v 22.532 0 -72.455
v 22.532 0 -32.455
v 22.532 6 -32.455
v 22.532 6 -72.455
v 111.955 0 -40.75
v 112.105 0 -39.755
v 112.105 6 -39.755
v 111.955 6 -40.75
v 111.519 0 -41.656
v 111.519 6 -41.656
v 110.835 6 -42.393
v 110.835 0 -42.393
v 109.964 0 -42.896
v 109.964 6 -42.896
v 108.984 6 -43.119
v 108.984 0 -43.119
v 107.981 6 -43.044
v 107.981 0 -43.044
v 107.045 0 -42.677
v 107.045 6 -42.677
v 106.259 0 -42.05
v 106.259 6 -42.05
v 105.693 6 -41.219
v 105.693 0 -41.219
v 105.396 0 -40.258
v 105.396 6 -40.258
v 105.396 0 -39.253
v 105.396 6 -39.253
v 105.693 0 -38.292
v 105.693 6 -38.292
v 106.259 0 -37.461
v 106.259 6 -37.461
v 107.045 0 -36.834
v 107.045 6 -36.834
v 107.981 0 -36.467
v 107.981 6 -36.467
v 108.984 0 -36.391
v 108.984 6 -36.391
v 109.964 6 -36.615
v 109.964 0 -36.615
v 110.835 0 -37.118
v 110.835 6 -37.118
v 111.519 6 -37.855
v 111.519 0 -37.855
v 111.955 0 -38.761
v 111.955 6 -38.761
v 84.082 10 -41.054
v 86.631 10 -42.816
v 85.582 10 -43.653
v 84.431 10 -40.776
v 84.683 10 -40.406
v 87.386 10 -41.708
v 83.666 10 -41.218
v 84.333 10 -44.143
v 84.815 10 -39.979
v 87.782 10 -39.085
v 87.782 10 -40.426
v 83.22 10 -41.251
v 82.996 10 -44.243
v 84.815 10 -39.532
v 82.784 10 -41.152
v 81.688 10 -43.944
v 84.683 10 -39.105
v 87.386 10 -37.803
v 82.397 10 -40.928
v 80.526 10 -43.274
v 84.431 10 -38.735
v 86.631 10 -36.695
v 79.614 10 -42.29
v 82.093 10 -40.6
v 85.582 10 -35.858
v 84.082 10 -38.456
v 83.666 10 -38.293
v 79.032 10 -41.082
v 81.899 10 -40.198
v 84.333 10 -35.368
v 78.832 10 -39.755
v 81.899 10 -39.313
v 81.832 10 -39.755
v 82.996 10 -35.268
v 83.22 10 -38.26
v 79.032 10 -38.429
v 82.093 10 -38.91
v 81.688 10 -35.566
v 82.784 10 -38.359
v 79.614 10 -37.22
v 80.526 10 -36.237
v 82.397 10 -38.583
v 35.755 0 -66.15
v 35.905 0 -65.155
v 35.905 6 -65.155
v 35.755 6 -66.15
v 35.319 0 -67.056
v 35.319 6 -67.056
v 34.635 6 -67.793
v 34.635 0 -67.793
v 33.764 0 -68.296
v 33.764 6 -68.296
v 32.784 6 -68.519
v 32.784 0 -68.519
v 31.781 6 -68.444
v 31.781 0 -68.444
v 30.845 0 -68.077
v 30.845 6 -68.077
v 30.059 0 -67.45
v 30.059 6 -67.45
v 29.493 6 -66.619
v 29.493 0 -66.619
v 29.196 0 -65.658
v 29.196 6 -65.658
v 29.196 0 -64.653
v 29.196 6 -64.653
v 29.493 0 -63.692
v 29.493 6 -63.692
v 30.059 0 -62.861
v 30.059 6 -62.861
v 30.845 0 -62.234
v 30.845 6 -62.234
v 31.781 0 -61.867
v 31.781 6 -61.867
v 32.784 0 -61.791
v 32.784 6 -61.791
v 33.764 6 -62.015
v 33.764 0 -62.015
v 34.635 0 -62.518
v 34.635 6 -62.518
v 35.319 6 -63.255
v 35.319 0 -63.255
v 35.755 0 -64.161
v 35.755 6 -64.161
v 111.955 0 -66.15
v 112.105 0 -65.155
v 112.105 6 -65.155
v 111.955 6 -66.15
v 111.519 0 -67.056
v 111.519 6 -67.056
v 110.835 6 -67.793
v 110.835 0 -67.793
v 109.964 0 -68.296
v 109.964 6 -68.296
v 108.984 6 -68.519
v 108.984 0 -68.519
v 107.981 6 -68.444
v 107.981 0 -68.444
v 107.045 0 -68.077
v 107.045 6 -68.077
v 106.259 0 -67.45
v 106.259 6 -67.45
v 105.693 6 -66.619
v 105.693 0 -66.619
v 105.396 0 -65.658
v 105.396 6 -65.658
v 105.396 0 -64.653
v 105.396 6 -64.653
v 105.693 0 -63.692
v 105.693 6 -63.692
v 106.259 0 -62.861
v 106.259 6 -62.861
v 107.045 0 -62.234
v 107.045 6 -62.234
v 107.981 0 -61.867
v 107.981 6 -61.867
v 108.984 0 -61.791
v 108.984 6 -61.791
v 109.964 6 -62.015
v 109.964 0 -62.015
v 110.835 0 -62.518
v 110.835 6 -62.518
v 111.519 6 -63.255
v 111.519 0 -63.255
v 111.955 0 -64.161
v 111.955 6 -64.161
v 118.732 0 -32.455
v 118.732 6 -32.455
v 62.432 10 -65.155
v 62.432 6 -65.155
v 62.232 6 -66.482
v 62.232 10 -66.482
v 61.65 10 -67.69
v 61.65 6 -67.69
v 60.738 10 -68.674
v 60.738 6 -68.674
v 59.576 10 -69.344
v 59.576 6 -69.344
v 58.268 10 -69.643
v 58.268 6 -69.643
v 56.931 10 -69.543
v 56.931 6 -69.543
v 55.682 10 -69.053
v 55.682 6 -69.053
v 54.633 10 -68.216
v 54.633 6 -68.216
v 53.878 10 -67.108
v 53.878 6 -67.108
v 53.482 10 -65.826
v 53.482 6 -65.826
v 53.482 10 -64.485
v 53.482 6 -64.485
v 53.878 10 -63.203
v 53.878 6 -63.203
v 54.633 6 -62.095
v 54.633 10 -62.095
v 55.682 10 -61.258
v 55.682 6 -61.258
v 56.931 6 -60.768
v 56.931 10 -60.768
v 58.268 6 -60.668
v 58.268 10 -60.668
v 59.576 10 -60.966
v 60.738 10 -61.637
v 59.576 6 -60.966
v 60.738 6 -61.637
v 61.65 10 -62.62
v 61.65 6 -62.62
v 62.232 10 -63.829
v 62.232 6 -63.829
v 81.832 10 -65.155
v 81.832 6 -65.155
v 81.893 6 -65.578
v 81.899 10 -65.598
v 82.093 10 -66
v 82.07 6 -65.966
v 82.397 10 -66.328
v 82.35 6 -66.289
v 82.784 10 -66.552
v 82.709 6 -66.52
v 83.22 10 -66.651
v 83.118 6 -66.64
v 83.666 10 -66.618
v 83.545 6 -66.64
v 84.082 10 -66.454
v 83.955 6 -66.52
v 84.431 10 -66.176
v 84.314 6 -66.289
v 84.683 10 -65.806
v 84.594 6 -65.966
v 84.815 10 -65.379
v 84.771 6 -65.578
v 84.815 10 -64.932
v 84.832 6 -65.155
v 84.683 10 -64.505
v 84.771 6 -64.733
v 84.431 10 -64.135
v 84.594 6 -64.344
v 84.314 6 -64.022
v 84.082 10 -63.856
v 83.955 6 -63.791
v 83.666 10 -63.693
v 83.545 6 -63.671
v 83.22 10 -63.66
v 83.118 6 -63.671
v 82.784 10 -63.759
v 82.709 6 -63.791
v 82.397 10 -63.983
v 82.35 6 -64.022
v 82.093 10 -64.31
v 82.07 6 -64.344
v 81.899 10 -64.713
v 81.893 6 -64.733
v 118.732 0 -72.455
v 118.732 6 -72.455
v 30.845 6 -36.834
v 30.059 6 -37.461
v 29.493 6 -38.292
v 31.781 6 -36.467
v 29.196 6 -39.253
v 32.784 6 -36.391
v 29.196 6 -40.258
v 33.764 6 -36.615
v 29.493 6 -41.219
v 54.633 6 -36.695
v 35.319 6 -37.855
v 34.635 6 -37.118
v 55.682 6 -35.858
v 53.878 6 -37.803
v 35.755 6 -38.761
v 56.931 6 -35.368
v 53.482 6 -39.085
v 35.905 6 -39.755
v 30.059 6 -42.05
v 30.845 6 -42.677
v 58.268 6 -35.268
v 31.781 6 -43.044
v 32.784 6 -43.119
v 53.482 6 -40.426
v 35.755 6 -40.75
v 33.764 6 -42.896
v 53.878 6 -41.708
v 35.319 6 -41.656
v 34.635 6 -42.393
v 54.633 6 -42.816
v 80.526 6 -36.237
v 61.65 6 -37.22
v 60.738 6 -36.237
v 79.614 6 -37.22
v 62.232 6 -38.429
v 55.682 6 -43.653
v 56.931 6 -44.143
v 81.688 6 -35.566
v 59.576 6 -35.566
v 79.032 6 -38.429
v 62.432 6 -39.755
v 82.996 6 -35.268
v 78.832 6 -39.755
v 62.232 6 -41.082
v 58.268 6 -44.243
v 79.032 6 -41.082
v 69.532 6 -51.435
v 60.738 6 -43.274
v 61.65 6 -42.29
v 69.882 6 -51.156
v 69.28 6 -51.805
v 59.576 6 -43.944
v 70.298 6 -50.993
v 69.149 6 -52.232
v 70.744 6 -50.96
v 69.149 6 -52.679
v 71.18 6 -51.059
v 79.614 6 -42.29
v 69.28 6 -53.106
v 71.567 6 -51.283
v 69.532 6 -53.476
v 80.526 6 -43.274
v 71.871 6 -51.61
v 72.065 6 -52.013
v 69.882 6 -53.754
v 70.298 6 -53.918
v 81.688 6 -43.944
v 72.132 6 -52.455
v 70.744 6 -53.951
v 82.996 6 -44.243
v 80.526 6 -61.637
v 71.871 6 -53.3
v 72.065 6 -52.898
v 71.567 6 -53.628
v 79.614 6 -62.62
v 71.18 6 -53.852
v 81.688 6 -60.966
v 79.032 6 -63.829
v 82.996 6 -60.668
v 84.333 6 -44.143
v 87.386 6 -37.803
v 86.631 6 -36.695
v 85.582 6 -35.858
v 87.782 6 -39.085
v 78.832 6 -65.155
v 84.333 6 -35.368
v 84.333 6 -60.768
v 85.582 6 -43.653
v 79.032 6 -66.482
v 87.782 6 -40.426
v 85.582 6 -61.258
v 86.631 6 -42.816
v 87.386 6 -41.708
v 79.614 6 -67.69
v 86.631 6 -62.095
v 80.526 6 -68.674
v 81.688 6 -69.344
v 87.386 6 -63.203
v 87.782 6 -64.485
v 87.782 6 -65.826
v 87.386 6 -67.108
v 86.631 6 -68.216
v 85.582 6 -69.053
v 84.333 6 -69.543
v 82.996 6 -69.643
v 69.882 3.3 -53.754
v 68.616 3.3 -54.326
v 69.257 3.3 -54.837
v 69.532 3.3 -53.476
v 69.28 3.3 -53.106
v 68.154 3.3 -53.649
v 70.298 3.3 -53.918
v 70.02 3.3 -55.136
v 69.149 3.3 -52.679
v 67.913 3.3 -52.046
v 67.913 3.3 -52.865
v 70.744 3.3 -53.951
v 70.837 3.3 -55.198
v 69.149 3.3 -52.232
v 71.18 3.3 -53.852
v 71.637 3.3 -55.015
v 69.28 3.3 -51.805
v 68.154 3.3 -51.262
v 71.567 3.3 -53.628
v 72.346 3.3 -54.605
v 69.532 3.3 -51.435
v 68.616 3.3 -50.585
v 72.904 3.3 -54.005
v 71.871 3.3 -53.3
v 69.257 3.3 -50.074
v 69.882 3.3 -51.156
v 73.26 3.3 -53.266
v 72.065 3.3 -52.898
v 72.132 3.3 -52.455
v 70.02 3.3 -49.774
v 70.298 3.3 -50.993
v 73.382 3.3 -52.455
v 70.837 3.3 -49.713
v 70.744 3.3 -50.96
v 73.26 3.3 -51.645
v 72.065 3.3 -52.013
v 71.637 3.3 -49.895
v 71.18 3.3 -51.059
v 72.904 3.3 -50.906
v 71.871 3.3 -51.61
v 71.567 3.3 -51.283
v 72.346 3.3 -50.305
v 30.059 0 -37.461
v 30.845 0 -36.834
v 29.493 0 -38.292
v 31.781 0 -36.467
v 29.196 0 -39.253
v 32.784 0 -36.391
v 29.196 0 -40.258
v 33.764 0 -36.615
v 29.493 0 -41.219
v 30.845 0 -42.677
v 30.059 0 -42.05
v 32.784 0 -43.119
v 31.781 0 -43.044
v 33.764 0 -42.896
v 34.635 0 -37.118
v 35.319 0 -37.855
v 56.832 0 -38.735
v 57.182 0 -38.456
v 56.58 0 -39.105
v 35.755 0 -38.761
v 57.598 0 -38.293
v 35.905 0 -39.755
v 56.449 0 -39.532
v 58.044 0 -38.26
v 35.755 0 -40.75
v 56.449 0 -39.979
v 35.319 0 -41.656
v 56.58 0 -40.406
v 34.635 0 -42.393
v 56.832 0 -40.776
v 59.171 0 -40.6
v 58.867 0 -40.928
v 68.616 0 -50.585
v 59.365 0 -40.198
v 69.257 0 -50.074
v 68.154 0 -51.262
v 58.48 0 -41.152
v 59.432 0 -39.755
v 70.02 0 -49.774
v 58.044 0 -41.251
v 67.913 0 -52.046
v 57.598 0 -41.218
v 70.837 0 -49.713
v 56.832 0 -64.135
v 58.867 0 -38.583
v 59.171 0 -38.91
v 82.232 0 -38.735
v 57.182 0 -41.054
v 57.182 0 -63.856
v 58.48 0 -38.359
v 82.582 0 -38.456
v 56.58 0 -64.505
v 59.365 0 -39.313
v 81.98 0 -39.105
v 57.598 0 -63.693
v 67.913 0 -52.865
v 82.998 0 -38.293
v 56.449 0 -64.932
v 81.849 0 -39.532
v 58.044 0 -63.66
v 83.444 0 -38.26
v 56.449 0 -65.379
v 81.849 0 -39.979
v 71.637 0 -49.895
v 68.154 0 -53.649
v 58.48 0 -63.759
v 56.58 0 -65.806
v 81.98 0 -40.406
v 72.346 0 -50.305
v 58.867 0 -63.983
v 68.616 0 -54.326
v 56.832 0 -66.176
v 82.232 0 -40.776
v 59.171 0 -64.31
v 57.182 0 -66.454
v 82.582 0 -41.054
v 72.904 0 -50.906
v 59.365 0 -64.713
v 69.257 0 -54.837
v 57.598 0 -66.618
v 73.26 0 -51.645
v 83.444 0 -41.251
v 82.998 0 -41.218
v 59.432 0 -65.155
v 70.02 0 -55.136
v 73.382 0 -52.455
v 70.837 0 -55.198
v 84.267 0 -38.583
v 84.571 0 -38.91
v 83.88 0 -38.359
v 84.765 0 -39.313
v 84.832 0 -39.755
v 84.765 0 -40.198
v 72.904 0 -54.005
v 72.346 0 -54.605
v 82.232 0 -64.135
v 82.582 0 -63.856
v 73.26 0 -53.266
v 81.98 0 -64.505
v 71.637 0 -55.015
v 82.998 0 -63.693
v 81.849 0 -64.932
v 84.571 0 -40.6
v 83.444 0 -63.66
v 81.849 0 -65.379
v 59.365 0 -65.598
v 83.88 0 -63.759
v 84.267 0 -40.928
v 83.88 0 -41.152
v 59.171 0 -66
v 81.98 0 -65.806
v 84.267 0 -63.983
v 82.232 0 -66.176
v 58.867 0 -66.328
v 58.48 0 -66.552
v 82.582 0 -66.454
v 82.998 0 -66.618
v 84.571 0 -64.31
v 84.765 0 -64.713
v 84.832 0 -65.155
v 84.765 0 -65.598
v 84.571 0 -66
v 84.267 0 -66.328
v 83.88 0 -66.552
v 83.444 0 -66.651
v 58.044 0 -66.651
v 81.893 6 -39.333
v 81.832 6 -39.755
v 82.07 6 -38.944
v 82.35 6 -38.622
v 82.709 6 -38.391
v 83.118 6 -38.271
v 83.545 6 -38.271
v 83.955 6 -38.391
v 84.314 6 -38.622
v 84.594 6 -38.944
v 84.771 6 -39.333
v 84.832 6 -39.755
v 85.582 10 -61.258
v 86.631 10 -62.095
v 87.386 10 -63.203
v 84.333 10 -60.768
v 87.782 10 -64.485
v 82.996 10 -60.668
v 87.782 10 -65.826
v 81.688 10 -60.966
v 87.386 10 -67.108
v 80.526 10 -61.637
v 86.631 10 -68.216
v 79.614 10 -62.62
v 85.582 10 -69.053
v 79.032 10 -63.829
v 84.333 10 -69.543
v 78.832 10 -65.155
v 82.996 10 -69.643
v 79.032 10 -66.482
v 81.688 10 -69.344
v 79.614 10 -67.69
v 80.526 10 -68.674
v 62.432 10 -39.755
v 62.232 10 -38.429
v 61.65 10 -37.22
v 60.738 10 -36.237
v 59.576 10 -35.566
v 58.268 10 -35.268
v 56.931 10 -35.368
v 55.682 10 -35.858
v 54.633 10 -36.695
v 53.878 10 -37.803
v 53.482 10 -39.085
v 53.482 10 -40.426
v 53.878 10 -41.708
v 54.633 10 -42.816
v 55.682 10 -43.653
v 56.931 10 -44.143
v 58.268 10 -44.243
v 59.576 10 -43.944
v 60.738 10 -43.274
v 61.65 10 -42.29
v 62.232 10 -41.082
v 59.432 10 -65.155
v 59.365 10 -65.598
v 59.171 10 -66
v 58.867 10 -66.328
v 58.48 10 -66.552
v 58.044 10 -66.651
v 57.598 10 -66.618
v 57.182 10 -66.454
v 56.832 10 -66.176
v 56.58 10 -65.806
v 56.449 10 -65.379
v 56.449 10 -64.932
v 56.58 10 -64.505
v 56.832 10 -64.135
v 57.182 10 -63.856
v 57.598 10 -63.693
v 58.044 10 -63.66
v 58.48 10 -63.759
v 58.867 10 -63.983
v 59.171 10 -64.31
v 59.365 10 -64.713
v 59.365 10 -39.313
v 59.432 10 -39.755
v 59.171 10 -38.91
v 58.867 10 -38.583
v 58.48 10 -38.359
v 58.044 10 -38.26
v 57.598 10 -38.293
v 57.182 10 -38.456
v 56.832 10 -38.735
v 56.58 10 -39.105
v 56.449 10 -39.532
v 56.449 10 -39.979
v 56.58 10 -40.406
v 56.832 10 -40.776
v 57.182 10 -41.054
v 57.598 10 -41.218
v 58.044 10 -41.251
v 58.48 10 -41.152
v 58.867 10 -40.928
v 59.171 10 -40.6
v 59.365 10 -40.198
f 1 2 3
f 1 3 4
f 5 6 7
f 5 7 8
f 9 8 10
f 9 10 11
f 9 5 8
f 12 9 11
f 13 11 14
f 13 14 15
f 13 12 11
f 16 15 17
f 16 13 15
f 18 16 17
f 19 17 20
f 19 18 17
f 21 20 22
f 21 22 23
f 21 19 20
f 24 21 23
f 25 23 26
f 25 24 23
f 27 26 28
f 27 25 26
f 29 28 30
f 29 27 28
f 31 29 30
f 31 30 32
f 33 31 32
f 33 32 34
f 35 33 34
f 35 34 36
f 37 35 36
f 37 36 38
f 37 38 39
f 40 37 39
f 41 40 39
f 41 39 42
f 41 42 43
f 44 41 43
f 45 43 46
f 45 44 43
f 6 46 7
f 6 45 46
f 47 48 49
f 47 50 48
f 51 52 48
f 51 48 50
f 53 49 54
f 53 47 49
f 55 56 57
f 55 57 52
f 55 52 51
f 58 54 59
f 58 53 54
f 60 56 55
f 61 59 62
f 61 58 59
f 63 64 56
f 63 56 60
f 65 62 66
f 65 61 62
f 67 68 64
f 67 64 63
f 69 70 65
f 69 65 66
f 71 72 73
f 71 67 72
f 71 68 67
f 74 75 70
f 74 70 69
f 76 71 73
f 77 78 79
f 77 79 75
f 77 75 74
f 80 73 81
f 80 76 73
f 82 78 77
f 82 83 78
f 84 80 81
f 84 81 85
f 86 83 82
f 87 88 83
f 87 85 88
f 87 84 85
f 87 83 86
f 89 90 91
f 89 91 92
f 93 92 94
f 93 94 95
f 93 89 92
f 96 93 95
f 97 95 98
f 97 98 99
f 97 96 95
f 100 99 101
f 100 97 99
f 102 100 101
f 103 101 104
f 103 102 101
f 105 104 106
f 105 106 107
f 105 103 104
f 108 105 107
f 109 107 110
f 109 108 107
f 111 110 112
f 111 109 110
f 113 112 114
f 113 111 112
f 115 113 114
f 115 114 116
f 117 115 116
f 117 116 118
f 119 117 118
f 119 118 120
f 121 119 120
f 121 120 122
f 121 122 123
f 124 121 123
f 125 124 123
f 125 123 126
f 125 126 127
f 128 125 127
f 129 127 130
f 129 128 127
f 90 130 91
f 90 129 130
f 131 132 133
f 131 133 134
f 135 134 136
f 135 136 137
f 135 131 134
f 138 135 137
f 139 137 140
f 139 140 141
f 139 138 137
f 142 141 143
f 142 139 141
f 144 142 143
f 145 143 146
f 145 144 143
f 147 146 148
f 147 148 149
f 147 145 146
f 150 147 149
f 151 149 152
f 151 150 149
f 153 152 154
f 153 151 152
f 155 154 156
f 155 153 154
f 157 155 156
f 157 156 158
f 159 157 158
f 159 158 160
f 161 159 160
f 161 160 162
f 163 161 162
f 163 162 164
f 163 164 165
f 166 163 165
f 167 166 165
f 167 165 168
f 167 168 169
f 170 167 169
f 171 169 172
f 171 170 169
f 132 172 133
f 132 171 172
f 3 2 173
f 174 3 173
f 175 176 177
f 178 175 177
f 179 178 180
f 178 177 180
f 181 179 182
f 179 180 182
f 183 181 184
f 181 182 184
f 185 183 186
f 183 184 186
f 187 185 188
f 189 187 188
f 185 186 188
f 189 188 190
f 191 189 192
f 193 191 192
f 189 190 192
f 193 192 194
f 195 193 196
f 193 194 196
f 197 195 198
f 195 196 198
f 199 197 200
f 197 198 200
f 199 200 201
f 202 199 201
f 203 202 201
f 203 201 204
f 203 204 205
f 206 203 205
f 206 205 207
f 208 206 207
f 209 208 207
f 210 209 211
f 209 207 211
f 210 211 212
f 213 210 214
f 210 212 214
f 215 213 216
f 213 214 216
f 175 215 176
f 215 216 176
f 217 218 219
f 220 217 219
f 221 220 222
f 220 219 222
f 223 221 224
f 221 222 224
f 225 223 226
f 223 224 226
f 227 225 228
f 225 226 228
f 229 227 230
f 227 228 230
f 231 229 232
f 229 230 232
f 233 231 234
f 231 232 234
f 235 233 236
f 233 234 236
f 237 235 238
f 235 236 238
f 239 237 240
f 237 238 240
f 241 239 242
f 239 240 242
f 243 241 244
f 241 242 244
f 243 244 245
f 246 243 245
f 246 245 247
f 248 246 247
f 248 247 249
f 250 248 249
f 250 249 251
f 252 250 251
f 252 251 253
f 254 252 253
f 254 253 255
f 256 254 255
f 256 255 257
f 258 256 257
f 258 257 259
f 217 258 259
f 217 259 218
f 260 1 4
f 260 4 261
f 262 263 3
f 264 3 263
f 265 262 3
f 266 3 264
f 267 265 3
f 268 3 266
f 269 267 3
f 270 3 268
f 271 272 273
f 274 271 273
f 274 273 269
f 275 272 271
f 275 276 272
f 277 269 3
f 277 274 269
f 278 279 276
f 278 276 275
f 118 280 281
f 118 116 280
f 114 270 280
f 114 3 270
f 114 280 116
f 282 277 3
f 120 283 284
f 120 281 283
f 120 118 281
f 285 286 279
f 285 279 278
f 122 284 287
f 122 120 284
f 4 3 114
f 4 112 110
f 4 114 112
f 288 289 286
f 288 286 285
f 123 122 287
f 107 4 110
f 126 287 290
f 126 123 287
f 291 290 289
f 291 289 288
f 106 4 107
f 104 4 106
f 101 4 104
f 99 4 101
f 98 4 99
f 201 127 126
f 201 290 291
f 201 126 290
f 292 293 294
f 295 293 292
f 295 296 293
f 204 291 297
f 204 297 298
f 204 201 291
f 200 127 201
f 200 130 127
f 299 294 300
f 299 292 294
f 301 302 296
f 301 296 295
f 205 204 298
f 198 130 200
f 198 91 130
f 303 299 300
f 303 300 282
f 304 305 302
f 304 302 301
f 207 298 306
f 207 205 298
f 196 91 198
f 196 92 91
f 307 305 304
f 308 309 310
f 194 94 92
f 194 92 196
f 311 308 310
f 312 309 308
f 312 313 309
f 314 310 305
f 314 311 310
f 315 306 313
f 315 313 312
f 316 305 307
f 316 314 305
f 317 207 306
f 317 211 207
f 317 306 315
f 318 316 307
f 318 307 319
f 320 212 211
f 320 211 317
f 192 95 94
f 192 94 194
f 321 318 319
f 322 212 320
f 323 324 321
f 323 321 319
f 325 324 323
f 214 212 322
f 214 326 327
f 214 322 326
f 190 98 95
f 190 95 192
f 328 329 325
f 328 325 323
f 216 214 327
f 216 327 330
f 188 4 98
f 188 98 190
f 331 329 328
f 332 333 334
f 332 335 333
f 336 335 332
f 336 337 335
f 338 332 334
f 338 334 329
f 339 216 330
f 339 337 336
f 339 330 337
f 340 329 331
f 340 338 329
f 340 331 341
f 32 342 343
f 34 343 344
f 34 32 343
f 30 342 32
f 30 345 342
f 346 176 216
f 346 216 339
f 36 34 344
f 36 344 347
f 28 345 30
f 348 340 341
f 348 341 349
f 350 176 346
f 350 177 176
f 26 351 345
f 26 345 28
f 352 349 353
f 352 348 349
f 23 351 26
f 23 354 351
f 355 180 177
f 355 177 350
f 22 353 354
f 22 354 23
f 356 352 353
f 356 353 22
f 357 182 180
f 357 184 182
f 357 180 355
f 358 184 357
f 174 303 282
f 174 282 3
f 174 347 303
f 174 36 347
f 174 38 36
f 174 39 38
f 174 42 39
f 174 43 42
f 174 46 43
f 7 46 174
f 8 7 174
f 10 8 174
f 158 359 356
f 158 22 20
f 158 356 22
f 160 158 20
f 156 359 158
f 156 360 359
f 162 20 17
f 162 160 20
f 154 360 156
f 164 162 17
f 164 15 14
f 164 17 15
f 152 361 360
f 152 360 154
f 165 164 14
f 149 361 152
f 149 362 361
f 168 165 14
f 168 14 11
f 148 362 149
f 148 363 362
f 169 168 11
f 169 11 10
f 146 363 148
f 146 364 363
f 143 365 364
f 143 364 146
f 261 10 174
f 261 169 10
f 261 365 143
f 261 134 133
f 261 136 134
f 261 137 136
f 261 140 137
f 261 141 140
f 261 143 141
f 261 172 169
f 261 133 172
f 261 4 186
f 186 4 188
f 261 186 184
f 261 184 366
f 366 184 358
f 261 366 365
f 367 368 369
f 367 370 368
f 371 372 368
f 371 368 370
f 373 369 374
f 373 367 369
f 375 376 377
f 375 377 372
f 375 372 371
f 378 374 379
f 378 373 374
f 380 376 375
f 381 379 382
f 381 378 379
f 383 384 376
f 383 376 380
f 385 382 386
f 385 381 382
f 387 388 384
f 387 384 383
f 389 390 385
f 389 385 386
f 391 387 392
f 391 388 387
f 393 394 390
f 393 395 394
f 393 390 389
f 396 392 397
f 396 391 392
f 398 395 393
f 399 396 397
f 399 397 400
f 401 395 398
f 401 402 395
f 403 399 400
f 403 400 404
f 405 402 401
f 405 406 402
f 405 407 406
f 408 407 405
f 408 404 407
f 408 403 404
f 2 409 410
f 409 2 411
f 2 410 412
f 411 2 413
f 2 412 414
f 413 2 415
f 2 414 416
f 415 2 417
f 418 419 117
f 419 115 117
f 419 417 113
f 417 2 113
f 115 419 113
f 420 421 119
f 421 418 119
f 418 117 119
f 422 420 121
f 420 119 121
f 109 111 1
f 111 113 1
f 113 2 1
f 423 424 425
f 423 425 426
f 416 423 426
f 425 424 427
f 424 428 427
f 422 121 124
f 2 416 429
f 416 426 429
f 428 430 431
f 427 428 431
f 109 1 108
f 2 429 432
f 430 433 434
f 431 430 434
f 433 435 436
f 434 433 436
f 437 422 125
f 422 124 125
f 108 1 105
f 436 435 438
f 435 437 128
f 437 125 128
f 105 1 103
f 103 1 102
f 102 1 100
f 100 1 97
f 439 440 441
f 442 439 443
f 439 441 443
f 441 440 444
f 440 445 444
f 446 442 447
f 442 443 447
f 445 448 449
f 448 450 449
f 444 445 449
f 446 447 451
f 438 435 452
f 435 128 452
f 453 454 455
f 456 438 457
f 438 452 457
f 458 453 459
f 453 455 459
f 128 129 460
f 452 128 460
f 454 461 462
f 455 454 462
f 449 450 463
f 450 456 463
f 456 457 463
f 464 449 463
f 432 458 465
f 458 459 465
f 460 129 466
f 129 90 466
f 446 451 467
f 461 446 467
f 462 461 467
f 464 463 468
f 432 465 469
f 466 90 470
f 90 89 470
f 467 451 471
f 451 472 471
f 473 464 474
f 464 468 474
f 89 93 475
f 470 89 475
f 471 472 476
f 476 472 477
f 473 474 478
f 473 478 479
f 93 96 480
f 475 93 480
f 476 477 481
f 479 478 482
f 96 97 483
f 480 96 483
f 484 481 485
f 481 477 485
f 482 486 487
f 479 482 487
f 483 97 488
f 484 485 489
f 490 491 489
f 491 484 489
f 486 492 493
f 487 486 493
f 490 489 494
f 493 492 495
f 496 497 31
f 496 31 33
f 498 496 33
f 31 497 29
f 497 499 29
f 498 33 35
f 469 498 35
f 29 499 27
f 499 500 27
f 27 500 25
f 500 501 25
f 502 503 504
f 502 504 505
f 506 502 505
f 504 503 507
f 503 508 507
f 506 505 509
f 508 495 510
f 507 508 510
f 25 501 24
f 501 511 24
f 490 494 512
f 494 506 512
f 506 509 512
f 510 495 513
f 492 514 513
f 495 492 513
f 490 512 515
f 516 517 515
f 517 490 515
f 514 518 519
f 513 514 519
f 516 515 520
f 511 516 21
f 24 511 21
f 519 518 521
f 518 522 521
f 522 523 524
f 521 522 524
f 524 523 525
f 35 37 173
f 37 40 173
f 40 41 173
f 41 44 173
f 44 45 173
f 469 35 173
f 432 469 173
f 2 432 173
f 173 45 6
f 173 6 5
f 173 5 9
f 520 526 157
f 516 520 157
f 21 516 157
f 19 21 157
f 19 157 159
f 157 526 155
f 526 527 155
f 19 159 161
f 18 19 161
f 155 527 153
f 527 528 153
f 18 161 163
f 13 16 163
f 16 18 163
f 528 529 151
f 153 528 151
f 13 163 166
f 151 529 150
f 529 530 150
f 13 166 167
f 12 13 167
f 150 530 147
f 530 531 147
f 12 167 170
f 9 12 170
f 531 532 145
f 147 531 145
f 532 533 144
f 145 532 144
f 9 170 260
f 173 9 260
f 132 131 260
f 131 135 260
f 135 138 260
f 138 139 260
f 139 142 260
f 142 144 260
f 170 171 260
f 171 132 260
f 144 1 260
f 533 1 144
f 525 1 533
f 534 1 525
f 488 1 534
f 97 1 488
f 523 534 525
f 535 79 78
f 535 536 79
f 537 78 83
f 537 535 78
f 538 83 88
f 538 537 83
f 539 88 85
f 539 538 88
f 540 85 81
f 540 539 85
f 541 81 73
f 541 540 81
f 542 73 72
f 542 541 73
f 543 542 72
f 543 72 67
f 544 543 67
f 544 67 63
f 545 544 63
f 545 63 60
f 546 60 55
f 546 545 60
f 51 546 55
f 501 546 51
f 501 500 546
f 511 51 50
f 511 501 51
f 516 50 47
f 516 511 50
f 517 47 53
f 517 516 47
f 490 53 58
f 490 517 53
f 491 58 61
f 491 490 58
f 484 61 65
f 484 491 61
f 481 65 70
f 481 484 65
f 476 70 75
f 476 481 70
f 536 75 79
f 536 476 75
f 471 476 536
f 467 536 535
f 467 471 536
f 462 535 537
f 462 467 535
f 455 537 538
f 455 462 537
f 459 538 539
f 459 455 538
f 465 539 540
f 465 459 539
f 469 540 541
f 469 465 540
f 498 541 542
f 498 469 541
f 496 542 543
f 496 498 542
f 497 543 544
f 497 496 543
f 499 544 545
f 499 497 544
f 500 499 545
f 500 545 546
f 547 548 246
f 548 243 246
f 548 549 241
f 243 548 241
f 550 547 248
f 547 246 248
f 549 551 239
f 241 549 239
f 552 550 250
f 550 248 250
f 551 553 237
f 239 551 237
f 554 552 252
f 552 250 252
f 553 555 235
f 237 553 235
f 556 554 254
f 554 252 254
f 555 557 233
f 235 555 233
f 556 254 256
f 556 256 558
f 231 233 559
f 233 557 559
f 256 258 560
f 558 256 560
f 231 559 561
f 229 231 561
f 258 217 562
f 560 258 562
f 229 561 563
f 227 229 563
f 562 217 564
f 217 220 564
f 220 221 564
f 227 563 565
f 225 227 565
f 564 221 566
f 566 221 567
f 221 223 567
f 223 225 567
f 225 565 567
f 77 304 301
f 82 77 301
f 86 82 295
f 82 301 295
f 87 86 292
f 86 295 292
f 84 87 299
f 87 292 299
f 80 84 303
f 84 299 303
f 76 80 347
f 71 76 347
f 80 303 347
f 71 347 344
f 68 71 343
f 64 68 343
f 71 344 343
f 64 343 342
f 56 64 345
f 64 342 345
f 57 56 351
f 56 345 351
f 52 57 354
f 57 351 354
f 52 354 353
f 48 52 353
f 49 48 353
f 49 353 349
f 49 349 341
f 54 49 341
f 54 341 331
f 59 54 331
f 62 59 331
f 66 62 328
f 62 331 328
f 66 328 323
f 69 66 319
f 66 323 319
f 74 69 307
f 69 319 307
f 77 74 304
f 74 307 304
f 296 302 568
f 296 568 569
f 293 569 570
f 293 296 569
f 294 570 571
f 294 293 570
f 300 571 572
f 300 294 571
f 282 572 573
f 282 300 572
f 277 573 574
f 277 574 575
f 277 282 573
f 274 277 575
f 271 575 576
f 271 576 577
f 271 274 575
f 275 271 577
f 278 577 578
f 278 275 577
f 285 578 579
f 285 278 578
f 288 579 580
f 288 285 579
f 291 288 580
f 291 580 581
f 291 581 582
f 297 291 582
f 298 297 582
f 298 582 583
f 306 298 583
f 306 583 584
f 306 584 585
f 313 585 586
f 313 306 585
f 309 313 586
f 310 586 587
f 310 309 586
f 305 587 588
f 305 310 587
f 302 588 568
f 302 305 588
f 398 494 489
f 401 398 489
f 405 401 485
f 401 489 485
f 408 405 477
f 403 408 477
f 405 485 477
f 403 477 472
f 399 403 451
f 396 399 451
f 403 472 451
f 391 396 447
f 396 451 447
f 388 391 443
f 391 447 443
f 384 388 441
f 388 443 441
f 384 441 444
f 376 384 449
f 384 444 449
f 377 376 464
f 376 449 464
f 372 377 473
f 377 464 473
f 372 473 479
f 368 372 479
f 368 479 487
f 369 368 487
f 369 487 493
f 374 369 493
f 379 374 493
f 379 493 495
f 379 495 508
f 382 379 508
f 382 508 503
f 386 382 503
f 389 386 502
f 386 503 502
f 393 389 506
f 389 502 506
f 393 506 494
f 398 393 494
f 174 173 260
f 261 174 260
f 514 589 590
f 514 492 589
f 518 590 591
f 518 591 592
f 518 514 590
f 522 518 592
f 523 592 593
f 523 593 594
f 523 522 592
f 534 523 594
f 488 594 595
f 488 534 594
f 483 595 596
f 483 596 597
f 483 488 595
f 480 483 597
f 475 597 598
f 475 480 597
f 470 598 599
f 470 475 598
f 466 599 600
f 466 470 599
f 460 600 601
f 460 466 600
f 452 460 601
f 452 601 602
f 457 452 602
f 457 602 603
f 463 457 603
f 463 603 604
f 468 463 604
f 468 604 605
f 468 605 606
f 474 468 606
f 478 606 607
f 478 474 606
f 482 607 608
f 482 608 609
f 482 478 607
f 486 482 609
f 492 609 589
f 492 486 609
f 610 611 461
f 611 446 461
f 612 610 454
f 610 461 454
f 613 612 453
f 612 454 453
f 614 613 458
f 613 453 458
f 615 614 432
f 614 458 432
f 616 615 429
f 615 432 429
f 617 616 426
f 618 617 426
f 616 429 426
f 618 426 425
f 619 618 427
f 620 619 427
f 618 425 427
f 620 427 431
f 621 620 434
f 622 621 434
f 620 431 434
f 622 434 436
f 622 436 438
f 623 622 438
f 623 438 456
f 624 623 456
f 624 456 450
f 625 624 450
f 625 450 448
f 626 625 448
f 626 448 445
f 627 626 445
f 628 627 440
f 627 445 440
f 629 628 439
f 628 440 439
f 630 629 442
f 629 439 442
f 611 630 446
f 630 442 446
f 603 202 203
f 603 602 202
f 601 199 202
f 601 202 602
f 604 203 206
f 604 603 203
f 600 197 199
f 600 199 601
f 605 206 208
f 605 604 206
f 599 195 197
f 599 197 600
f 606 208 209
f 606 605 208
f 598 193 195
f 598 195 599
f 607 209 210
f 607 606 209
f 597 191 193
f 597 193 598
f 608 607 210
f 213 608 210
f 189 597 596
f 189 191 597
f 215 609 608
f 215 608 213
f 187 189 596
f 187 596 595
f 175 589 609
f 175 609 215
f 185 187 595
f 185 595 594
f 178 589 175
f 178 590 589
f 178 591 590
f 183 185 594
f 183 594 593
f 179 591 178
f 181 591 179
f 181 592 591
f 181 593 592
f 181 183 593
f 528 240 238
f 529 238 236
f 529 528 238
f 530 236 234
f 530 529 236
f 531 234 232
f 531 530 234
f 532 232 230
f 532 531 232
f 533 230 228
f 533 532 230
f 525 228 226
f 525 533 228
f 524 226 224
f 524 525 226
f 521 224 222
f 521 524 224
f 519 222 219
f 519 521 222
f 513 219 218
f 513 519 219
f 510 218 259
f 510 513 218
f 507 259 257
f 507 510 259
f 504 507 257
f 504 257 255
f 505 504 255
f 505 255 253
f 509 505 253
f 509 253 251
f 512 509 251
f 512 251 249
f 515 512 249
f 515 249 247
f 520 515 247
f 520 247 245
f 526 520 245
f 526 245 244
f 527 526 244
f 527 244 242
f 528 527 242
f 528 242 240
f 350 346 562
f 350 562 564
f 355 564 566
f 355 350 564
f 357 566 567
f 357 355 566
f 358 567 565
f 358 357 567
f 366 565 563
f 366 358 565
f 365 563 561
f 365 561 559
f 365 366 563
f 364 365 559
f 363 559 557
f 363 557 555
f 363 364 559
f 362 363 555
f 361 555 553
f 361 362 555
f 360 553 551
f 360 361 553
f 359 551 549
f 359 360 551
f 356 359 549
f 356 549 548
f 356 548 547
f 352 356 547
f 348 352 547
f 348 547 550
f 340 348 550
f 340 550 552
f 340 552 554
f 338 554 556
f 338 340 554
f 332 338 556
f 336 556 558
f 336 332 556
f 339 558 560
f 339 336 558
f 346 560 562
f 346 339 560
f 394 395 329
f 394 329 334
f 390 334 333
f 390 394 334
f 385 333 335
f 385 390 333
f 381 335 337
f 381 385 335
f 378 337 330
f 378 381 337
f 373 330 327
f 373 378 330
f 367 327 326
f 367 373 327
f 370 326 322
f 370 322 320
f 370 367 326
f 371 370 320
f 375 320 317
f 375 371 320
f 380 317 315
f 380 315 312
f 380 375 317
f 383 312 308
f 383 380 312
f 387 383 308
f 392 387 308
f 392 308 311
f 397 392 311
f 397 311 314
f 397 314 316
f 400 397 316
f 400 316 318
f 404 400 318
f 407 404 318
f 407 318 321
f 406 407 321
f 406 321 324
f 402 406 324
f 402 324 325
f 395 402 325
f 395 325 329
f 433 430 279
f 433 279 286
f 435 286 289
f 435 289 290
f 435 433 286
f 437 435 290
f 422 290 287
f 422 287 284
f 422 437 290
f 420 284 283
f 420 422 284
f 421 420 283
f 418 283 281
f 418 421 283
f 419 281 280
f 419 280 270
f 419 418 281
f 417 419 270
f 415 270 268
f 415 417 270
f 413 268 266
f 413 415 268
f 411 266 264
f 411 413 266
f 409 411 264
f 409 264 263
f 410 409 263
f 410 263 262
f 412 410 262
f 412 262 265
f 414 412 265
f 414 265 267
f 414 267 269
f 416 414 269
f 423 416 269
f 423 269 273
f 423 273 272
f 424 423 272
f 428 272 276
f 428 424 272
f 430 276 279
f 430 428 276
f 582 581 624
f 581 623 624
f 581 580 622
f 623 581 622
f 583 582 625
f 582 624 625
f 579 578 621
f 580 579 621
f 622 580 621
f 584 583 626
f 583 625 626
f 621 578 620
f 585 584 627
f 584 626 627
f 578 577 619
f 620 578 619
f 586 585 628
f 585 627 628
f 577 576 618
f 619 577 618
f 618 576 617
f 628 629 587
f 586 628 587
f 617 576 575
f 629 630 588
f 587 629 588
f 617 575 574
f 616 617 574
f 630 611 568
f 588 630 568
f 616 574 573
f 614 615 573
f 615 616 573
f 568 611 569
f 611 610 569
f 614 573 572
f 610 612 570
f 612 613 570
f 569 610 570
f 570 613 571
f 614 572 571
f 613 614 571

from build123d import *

# Parameters (mm, degrees)
SKETCH2_W                 = 96.2
SKETCH2_H                 = 40
SKETCH2_R                 = 1.5
SKETCH2_R_2               = 3.3734375
BOSS_EXTRUDE1_DEPTH       = 6
SKETCH3_R                 = 4.5
SKETCH3_R_2               = 1.5
BOSS_EXTRUDE2_DEPTH       = 4
MIRROR2_COPY_1_SKETCH_R   = 4.5
MIRROR2_COPY_1_SKETCH_R_2 = 1.5
MIRROR2_COPY_1_DEPTH      = 4
SKETCH5_R                 = 2.75
CUT_EXTRUDE1_DEPTH        = 3.3


with BuildPart() as part:
    # Sketch2 → Boss-Extrude1 (new body)
    with BuildSketch(Plane(origin=(0, 0, 0), x_dir=(1, 0, 0), z_dir=(0, 1, 0))):
        with Locations((70.631888672, 52.455394598)):
            Rectangle(SKETCH2_W, SKETCH2_H)
        with Locations((57.931888672, 39.755394598)):
            Circle(SKETCH2_R, mode=Mode.SUBTRACT)
        with Locations((83.331888672, 39.755394598)):
            Circle(SKETCH2_R, mode=Mode.SUBTRACT)
        with Locations((70.631888672, 52.455394598)):
            Circle(SKETCH2_R, mode=Mode.SUBTRACT)
        with Locations((57.931888672, 65.155394598)):
            Circle(SKETCH2_R, mode=Mode.SUBTRACT)
        with Locations((83.331888672, 65.155394598)):
            Circle(SKETCH2_R, mode=Mode.SUBTRACT)
        with Locations((108.731888672, 65.155394598)):
            Circle(SKETCH2_R_2, mode=Mode.SUBTRACT)
        with Locations((108.731888672, 39.755394598)):
            Circle(SKETCH2_R_2, mode=Mode.SUBTRACT)
        with Locations((32.531888672, 65.155394598)):
            Circle(SKETCH2_R_2, mode=Mode.SUBTRACT)
        with Locations((32.531888672, 39.755394598)):
            Circle(SKETCH2_R_2, mode=Mode.SUBTRACT)
    extrude(amount=BOSS_EXTRUDE1_DEPTH)

    # Sketch3 → Boss-Extrude2 (add)
    with BuildSketch(Plane(origin=(0, 6, 0), x_dir=(1, 0, 0), z_dir=(0, 1, 0))):
        with Locations((57.931888672, 65.155394598)):
            Circle(SKETCH3_R)
        with Locations((57.931888672, 65.155394598)):
            Circle(SKETCH3_R_2, mode=Mode.SUBTRACT)
    boss_extrude2 = extrude(amount=BOSS_EXTRUDE2_DEPTH)

    # Mirror1: Boss-Extrude2 across plane
    add(boss_extrude2.mirror(Plane.ZY.offset(-70.631888672)))

    # Mirror2: Boss-Extrude2 across plane
    add(boss_extrude2.mirror(Plane(origin=(0, 0, -52.455394598), x_dir=(1, 0, 0), z_dir=(0, 0, -1))))

    # Mirror2 copy 1 sketch → Mirror2 copy 1 (add)
    with BuildSketch(Plane(origin=(141.263777343, 6, -104.910789197), x_dir=(-1, 0, 0), z_dir=(0, 1, 0))):
        with Locations((57.931888672, 65.155394598)):
            Circle(MIRROR2_COPY_1_SKETCH_R)
        with Locations((57.931888672, 65.155394598)):
            Circle(MIRROR2_COPY_1_SKETCH_R_2, mode=Mode.SUBTRACT)
    extrude(amount=MIRROR2_COPY_1_DEPTH)

    # Sketch5 → Cut-Extrude1 (cut)
    with BuildSketch(Plane.XZ):
        with Locations((70.631888672, -52.455394598)):
            Circle(SKETCH5_R)
    extrude(amount=-CUT_EXTRUDE1_DEPTH, mode=Mode.SUBTRACT)


solid = part.part
